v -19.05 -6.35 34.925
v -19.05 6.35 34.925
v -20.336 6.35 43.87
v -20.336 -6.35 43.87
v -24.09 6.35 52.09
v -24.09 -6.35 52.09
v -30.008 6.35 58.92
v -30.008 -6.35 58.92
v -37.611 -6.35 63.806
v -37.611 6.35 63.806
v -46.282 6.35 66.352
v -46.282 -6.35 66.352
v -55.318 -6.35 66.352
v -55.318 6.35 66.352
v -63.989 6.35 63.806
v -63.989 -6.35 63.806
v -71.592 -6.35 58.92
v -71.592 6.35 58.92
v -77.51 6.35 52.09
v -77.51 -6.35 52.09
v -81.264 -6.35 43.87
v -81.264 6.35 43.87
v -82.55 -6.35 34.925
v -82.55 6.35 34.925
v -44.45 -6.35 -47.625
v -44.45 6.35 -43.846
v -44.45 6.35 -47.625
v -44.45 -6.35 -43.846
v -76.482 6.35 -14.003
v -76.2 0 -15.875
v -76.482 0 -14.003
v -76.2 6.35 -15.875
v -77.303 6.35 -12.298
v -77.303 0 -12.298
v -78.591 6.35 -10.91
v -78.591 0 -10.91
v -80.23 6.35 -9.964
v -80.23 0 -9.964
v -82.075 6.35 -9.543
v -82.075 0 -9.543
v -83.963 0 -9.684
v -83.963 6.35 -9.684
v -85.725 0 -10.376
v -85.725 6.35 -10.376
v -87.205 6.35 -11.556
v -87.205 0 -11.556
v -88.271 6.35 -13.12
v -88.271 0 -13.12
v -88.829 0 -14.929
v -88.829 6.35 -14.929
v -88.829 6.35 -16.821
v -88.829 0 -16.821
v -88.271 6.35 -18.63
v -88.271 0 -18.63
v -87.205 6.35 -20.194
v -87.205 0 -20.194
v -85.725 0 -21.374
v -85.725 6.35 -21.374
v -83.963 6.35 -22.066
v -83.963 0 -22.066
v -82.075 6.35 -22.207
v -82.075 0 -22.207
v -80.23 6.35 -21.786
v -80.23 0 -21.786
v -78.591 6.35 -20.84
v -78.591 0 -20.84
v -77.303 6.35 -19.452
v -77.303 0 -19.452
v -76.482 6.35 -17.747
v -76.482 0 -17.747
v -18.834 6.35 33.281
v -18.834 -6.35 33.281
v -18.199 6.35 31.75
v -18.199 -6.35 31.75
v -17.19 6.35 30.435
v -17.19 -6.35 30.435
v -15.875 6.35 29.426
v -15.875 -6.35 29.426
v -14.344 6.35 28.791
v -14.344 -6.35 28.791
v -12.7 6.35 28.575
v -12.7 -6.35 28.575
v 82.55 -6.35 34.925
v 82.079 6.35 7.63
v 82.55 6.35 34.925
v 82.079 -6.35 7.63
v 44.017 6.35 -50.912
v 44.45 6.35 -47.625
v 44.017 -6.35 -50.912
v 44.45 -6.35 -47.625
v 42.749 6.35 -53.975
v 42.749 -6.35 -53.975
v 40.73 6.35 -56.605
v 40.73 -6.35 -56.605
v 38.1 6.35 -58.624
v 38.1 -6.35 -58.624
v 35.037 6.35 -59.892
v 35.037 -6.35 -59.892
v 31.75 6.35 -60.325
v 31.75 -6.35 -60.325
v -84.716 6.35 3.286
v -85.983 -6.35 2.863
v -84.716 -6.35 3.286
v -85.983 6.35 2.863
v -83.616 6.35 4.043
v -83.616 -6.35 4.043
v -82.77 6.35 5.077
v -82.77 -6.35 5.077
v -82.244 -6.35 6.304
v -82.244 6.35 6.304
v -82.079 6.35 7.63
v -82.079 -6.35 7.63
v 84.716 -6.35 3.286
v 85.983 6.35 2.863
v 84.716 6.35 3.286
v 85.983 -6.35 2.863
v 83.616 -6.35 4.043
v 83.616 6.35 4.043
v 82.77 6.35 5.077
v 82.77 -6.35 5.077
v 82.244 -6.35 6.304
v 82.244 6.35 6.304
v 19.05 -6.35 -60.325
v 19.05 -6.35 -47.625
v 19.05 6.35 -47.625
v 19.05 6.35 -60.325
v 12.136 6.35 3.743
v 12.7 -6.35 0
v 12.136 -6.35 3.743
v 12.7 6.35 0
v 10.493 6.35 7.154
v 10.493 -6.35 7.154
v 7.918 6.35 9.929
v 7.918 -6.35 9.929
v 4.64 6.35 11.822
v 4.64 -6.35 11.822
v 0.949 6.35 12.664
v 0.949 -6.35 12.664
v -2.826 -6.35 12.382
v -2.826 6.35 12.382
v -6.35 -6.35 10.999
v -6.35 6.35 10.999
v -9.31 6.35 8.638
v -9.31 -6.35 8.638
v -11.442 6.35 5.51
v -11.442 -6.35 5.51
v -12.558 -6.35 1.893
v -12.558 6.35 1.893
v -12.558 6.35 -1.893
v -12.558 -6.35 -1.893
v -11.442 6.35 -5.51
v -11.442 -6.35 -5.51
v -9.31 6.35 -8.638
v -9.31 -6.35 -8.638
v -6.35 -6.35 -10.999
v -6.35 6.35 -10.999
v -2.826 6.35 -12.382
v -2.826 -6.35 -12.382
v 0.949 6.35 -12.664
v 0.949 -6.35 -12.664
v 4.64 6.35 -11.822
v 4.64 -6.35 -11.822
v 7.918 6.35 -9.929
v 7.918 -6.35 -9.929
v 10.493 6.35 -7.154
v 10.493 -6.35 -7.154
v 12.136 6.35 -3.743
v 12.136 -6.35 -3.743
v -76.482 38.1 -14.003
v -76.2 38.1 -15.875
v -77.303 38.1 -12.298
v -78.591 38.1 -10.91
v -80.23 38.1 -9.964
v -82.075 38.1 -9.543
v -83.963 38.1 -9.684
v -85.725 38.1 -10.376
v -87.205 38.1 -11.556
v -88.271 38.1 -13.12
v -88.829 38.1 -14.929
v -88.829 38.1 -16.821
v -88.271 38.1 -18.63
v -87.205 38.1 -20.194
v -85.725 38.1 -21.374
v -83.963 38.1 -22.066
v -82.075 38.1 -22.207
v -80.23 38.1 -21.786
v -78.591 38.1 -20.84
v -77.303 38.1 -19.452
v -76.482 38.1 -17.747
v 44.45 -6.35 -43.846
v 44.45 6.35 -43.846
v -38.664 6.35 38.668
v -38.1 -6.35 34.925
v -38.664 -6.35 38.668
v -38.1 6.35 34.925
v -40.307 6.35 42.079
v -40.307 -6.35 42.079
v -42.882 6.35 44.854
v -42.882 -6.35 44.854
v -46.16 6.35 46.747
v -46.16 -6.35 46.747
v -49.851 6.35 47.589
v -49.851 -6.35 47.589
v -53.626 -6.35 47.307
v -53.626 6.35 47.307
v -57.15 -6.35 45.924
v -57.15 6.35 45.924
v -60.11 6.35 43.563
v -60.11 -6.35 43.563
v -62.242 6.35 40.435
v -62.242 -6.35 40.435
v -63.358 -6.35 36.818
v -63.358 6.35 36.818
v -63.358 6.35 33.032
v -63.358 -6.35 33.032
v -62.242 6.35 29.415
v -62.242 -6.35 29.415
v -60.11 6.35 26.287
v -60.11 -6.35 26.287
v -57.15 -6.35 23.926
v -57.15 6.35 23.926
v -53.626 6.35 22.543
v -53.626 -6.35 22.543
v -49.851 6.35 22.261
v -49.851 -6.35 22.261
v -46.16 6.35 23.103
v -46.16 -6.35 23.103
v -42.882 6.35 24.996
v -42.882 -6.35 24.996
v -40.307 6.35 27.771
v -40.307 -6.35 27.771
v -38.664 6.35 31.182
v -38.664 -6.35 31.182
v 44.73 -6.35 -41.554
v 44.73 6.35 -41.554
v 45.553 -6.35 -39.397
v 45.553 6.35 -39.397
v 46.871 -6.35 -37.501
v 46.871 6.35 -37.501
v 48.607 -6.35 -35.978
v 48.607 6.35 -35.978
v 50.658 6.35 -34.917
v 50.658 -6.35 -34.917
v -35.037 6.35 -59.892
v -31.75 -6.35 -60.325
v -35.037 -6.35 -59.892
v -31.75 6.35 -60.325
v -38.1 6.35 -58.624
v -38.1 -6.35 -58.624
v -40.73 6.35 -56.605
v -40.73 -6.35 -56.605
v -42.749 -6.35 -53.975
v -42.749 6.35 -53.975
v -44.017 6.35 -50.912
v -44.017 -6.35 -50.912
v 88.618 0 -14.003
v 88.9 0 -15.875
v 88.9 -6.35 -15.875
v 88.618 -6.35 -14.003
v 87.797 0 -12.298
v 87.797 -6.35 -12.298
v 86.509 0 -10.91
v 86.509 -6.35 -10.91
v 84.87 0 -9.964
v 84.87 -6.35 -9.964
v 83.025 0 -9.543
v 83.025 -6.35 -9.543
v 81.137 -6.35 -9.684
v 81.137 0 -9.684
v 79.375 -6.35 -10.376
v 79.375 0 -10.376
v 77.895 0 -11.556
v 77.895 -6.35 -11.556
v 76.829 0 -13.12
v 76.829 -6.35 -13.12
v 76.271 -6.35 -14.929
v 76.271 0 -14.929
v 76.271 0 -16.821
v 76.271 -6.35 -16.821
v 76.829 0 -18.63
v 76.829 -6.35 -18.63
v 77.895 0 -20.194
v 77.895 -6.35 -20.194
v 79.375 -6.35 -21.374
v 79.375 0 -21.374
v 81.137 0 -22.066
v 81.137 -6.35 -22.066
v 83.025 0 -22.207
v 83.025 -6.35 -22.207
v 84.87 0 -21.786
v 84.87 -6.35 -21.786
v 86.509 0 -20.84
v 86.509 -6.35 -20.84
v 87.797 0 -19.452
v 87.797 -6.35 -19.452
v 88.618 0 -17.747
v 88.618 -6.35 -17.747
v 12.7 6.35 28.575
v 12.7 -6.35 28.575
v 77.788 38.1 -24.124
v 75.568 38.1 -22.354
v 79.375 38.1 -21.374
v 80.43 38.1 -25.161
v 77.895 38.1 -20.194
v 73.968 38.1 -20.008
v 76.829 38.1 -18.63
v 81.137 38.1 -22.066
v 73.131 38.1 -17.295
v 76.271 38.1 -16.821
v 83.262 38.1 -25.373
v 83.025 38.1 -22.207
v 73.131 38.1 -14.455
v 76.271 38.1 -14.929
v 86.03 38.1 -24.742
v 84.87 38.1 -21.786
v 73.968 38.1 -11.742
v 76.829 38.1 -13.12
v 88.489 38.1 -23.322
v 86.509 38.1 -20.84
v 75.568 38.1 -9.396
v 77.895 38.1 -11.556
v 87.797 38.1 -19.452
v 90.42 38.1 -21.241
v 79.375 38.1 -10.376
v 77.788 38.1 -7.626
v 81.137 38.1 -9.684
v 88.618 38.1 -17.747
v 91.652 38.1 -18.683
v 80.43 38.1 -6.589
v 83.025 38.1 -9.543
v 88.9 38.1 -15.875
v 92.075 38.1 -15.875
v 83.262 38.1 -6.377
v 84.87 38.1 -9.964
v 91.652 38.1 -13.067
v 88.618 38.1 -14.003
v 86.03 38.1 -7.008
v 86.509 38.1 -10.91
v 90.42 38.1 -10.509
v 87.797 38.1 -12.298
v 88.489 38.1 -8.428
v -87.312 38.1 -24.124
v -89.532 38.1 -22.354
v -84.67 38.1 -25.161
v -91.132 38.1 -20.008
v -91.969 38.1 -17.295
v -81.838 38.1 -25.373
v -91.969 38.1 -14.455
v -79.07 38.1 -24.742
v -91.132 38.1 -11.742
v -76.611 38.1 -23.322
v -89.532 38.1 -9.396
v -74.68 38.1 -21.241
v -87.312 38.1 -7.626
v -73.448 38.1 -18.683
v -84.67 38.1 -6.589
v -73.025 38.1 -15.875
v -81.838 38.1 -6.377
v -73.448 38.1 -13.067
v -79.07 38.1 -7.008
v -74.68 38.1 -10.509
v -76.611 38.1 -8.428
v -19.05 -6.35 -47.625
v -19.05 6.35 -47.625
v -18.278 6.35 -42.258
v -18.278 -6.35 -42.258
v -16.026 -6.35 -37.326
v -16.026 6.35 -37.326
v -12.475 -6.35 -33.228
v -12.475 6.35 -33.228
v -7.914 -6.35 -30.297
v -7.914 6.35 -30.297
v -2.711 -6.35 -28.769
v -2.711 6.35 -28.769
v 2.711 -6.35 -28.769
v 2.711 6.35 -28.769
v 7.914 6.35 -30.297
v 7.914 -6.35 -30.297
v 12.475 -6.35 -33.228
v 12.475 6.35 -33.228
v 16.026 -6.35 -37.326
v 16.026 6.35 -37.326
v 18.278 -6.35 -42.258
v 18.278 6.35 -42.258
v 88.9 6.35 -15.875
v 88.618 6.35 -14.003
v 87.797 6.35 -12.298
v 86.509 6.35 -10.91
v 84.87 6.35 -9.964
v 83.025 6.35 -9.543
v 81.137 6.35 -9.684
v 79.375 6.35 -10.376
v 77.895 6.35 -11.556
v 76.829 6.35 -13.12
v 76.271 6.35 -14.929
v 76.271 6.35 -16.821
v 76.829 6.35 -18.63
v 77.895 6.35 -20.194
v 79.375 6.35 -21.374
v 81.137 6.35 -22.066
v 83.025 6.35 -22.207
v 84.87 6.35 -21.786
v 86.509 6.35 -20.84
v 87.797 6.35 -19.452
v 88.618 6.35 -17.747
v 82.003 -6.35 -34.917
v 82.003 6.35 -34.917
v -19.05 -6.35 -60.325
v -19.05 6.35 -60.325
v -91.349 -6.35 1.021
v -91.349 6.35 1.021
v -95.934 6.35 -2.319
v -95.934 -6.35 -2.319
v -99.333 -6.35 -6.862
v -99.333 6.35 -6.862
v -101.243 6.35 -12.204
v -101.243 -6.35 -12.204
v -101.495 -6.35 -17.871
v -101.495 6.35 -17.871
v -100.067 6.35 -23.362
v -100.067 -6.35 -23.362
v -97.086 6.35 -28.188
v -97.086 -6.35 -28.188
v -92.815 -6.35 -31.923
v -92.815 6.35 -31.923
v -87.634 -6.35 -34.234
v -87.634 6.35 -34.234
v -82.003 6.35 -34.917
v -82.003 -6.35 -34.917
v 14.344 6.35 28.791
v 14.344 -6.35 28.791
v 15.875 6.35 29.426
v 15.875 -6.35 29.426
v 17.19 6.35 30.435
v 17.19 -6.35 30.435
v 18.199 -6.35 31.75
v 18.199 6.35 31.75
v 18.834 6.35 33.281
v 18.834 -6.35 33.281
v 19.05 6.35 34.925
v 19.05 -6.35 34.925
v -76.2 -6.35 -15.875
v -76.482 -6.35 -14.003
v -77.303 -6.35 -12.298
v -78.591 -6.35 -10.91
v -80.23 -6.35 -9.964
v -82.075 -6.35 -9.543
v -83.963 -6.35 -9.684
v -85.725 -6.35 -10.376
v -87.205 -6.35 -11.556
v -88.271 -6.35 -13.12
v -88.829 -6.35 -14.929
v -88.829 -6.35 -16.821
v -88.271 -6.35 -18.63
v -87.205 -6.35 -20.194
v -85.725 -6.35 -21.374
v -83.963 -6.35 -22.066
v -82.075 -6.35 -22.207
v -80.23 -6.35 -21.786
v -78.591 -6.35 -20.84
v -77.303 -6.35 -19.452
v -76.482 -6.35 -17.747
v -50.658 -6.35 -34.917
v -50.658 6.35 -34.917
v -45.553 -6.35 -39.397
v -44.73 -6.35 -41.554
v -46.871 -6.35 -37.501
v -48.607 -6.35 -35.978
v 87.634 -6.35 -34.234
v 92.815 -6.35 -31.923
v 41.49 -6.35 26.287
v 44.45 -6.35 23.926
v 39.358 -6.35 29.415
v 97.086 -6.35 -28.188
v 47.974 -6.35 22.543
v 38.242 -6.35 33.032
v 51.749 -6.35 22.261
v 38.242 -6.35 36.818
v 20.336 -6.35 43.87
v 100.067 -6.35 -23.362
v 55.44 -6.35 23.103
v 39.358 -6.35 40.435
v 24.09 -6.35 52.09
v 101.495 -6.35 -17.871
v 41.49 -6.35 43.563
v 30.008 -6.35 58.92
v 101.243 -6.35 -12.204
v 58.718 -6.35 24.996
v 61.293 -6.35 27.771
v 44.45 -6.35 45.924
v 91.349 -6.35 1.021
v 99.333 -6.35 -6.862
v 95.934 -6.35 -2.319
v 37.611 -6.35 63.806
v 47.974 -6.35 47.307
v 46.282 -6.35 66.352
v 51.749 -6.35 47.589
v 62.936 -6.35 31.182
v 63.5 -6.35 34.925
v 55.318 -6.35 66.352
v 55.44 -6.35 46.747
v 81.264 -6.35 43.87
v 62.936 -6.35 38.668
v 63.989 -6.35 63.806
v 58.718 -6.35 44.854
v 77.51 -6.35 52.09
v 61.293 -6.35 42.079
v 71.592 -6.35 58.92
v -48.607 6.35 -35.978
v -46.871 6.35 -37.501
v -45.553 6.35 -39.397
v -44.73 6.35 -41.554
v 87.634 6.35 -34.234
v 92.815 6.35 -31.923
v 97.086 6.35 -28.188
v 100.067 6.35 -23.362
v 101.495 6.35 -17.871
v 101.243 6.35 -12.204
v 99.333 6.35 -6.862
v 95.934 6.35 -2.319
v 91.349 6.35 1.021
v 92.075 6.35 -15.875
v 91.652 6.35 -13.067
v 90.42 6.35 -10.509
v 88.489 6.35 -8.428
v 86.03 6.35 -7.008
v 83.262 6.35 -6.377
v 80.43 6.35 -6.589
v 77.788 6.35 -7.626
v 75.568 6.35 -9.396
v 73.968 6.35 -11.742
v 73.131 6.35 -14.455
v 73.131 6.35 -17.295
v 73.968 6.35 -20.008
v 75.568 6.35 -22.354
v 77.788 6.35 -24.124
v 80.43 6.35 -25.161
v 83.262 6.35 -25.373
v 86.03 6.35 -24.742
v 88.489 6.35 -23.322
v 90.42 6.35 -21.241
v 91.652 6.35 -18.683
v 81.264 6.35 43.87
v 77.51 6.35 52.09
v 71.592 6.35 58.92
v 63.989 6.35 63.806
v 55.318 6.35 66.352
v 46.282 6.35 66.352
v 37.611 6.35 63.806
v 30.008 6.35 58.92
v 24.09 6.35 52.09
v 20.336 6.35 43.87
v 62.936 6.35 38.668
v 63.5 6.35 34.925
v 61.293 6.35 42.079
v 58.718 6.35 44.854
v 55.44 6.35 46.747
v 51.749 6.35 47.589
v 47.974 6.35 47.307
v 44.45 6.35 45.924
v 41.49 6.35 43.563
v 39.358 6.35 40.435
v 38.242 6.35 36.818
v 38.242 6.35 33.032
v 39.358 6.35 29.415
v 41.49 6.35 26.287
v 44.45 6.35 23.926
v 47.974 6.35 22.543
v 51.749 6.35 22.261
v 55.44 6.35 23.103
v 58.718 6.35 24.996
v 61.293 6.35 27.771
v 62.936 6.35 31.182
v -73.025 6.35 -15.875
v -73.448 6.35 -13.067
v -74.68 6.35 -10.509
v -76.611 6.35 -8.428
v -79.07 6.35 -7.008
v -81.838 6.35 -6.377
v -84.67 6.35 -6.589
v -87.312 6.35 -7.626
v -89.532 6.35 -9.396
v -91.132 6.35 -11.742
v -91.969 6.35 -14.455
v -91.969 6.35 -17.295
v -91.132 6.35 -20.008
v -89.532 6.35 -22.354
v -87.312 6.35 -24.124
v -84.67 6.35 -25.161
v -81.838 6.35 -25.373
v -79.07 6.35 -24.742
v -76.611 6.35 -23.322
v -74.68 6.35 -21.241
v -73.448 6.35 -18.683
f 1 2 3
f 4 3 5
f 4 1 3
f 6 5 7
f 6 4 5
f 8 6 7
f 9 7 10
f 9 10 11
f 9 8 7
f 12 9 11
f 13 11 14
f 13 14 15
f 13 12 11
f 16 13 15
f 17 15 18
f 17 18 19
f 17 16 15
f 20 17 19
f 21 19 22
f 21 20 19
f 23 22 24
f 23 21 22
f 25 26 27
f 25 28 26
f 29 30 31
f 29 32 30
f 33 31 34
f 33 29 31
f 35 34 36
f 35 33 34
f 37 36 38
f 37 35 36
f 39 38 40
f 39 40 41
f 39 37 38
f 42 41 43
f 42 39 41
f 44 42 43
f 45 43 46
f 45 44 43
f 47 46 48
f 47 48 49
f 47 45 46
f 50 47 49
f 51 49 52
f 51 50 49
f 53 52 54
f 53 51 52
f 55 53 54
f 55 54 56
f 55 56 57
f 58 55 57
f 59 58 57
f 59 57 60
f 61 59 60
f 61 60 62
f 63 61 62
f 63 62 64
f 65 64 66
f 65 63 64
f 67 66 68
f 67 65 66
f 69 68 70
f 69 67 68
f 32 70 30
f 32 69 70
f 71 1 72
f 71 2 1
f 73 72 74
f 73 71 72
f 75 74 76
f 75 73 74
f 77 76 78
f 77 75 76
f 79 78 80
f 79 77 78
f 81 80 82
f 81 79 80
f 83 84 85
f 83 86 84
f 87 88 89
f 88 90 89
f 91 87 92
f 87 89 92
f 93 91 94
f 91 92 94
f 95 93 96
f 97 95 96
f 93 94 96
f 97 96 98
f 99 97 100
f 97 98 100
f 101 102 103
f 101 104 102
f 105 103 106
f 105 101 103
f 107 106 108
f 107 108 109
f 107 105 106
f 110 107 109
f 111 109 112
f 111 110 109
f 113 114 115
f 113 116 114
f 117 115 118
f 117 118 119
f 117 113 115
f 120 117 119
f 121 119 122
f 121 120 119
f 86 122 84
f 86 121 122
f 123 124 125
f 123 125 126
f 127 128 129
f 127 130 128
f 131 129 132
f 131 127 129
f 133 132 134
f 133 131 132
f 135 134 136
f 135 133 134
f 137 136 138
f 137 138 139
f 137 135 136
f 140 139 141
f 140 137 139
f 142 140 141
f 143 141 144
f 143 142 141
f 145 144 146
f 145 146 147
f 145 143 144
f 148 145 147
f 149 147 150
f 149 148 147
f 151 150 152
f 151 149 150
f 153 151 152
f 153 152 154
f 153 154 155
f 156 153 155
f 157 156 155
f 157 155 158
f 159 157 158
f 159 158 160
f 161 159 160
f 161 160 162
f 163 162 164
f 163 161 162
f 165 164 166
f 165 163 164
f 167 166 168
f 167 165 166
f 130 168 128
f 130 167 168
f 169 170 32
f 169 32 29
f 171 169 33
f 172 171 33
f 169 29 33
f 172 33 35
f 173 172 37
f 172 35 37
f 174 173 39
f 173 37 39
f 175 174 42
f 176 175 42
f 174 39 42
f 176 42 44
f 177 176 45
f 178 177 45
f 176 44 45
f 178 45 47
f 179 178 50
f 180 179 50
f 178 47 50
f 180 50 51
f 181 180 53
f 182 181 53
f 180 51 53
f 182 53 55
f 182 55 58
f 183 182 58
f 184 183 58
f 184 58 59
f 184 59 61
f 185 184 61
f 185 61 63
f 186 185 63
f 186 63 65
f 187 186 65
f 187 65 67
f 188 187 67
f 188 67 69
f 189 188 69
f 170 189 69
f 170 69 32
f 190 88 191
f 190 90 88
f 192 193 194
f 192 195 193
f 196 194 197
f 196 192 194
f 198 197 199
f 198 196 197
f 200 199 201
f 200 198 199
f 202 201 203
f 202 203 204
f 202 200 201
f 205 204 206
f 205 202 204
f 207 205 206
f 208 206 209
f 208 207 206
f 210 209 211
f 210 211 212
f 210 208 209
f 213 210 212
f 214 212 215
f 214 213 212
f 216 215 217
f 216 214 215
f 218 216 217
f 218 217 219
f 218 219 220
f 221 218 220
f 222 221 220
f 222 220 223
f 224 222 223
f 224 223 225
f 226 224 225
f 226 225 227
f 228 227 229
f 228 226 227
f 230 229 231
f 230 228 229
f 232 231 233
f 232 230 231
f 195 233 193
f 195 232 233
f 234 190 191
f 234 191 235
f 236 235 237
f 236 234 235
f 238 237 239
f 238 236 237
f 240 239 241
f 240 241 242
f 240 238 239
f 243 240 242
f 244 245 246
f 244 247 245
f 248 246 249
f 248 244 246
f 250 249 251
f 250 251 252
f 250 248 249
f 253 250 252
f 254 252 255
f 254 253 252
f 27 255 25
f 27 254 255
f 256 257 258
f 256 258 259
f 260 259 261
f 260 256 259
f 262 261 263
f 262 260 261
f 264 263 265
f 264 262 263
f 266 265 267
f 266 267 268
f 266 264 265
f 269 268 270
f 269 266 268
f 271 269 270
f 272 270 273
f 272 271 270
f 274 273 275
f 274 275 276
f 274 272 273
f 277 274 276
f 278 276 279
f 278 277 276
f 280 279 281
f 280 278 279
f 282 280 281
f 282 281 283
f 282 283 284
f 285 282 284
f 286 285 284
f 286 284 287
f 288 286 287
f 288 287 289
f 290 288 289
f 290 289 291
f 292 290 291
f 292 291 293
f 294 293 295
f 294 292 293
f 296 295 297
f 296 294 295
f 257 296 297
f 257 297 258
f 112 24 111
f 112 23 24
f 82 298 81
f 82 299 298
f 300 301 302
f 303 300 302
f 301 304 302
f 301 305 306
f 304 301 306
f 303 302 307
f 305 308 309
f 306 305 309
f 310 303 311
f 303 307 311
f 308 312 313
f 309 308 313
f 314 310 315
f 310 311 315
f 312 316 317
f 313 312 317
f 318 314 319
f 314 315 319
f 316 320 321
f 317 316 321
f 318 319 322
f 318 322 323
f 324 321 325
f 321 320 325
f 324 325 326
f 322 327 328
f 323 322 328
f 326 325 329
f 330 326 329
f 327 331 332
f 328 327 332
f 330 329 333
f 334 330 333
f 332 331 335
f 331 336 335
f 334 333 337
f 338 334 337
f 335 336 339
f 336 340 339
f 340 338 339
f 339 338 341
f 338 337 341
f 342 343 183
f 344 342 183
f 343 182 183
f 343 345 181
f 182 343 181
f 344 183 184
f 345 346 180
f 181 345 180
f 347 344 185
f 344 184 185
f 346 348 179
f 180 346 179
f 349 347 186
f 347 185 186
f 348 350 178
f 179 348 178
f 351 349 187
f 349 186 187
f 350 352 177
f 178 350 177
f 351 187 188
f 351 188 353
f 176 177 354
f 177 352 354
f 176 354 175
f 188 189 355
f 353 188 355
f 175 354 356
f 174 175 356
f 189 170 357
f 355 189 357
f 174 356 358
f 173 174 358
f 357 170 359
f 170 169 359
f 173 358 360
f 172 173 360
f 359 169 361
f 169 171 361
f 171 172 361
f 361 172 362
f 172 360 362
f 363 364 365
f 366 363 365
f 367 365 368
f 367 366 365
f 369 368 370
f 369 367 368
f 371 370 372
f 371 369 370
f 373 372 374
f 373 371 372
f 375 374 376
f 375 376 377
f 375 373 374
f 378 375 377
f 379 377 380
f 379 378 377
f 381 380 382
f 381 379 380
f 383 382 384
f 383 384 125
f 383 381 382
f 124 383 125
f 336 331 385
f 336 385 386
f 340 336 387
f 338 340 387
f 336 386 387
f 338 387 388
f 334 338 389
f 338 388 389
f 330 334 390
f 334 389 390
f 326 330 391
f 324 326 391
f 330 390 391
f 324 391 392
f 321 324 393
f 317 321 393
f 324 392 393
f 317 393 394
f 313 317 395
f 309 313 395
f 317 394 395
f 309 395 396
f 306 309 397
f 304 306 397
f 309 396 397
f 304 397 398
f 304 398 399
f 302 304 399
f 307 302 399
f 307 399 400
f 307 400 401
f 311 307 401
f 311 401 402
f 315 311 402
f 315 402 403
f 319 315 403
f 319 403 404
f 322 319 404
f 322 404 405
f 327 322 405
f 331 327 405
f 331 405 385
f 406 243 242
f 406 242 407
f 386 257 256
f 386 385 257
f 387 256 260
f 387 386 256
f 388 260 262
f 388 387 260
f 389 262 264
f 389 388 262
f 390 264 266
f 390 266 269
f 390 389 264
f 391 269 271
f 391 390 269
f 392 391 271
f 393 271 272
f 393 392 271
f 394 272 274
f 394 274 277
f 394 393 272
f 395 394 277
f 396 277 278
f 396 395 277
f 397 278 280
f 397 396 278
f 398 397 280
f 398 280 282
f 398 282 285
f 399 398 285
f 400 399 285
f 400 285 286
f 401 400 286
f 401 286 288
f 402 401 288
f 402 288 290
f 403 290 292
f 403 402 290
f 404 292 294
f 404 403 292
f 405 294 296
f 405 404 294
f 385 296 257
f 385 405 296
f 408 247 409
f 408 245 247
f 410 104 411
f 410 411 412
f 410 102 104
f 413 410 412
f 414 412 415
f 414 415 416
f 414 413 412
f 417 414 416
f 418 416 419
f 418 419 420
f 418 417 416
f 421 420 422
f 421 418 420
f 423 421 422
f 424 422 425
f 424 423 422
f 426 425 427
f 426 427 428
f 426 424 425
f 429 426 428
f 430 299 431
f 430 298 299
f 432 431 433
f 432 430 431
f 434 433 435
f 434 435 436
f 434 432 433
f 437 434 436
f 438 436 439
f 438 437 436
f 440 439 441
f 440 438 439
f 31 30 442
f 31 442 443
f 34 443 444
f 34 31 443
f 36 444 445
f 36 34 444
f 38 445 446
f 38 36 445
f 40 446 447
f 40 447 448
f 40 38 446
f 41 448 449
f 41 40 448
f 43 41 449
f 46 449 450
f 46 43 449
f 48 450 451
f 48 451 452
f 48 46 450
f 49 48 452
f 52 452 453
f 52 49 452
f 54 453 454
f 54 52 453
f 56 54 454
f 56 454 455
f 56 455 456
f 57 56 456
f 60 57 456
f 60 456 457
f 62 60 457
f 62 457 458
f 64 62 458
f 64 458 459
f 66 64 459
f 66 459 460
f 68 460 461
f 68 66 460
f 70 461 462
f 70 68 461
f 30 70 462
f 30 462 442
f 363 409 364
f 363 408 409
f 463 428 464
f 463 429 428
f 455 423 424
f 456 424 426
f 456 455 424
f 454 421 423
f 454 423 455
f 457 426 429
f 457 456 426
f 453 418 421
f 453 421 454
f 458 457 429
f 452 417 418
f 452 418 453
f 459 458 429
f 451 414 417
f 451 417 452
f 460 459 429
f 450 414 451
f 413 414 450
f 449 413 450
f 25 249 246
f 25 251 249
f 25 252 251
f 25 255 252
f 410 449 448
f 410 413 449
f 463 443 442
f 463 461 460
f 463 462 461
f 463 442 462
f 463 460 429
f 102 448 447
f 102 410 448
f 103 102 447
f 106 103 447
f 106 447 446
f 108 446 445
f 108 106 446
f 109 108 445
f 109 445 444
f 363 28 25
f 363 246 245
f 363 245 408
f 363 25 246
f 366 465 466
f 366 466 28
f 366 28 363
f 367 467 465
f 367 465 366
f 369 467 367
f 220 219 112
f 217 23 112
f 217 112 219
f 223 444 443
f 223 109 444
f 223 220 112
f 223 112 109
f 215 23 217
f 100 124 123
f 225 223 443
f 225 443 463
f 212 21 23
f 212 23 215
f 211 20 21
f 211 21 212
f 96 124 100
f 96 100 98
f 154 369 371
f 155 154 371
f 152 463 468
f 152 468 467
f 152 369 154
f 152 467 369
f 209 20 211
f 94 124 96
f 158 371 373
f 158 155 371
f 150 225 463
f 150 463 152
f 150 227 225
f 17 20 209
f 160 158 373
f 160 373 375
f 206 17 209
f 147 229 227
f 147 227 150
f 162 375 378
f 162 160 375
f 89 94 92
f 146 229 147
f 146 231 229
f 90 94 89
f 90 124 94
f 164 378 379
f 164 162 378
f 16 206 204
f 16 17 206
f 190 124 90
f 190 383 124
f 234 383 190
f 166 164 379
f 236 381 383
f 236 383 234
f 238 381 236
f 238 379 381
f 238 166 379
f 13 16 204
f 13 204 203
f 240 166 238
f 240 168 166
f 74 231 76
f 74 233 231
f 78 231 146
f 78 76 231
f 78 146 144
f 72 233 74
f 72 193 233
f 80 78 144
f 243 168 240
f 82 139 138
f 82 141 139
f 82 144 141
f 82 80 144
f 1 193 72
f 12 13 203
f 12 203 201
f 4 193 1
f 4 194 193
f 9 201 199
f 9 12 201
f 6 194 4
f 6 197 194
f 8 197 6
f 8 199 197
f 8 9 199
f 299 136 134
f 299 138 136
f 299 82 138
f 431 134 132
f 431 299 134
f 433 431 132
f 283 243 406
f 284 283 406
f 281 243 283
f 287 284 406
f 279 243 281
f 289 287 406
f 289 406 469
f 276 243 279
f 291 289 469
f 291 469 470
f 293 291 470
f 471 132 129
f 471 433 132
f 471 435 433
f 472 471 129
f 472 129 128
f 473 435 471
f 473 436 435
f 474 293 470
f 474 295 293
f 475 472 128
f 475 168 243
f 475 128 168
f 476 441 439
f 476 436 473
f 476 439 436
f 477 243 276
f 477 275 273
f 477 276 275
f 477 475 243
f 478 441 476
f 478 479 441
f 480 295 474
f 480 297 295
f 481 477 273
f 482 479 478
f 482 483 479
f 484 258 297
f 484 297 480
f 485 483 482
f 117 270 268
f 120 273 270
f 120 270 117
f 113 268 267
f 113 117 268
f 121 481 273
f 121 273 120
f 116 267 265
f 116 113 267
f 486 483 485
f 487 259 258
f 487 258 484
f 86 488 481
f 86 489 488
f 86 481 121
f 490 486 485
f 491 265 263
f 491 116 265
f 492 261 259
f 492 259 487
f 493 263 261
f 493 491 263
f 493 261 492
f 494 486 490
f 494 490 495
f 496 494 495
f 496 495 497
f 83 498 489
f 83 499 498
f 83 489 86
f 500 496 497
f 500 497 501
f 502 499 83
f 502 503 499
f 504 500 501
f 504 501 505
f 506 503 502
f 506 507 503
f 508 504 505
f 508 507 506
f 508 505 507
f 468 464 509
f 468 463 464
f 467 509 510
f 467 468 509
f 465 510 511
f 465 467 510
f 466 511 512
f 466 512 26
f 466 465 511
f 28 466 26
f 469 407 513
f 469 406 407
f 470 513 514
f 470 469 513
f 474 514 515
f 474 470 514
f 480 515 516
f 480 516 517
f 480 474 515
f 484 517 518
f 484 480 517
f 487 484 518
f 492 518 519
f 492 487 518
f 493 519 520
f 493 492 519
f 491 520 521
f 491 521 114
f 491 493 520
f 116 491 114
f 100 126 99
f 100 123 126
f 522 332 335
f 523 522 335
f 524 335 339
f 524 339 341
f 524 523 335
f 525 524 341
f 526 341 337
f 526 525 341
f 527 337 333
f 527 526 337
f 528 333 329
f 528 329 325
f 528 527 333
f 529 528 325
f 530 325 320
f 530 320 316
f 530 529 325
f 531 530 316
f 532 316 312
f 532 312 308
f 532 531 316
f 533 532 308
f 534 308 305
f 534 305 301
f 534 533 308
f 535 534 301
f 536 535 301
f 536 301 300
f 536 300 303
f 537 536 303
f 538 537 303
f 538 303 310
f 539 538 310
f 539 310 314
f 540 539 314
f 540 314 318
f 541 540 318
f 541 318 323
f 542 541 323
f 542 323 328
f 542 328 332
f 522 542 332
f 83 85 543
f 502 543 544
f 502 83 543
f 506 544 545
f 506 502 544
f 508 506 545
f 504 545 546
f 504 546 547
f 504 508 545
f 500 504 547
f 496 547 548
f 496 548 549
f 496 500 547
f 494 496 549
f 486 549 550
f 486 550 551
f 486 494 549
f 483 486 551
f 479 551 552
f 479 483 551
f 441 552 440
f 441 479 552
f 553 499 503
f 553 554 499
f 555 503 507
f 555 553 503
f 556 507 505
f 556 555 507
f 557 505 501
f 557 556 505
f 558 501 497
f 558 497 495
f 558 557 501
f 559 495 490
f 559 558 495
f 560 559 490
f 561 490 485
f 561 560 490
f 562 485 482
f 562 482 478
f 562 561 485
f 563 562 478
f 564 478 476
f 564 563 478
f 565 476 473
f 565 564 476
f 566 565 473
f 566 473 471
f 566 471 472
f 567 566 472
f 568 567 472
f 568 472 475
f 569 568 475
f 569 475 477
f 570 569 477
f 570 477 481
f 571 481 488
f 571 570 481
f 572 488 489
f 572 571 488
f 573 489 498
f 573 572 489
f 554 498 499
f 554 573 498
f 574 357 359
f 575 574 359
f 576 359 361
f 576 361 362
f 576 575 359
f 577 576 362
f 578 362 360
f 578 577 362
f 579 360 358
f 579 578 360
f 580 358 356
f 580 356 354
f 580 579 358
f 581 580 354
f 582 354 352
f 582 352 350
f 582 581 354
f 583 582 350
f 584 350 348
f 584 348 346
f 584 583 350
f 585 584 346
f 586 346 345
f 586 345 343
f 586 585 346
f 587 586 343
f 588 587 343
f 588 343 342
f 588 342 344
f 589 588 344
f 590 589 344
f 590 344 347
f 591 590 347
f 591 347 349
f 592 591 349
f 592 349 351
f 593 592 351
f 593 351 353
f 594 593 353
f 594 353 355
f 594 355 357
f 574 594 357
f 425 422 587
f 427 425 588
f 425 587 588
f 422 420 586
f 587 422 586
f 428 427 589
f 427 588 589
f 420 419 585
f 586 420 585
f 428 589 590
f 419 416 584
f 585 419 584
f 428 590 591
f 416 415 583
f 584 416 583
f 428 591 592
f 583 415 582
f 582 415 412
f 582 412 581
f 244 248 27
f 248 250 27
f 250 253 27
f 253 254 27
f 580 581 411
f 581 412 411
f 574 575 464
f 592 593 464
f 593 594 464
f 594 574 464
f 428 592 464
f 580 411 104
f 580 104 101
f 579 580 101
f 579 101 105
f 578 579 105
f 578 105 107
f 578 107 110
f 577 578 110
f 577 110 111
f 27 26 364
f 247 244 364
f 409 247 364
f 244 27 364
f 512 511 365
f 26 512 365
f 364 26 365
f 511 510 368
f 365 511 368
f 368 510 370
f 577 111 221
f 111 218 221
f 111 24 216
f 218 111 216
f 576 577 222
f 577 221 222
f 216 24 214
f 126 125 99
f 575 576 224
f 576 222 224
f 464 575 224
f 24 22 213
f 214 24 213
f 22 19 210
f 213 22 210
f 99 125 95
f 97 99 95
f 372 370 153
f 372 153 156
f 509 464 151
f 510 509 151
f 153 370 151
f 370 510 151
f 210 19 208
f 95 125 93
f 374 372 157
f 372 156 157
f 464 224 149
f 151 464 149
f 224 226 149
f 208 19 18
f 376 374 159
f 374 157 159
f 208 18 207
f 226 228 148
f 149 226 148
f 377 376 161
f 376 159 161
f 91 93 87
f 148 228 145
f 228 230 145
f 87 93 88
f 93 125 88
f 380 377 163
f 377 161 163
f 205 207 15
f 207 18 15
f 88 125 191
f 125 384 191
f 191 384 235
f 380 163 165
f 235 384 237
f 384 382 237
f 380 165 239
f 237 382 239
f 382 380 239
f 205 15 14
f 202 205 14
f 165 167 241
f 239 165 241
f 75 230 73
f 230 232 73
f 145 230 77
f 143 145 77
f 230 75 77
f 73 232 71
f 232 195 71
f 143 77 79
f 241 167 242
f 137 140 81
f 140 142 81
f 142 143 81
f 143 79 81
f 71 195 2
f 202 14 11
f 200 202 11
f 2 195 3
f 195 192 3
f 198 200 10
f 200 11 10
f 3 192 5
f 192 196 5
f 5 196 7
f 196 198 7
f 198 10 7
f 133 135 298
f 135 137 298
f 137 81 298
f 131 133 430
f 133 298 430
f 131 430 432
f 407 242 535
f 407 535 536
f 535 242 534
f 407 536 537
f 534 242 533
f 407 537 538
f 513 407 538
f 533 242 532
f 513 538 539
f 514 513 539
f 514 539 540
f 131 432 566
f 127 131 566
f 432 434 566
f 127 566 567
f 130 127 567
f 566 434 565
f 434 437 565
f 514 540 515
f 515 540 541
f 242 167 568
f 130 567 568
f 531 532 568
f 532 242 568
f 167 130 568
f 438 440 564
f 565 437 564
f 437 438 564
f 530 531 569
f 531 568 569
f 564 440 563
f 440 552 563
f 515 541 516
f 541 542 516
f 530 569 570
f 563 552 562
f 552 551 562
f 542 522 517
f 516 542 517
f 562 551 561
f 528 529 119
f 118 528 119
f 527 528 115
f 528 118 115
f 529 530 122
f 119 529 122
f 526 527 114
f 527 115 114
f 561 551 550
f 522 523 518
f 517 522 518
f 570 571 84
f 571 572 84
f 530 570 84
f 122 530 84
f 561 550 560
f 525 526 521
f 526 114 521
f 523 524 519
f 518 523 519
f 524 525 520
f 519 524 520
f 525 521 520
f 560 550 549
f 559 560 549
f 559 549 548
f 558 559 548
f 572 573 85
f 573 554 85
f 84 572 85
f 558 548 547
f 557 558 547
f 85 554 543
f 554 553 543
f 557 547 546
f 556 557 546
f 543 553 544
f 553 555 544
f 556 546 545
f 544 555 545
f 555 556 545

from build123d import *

# Parameters (mm, degrees)
F0_R     = 9.525
F0_R_2   = 12.7
F0_R_3   = 6.35
F1_DEPTH = 6.35
F2_R     = 12.7
F3_R     = 4.7625
F4_R     = 6.34999
F5_DEPTH = 38.1


# Not quite as in the source:
# - a fillet or chamfer is up to 0.001 mm smaller than in the source, because OpenCascade refuses the exact size


with BuildPart() as f1:
    # F0 (on Front) → F1 (new body, symmetric)
    with BuildSketch(Plane.XZ):
        with BuildLine():
            Line((-19.05, -60.325), (-19.05, -47.625))
            ThreePointArc((-19.05, -47.625), (0, -28.575), (19.05, -47.625))
            Line((19.05, -47.625), (19.05, -60.325))
            Line((19.05, -60.325), (44.45, -60.325))
            Line((44.45, -60.325), (44.45, -43.8458790377))
            ThreePointArc((44.45, -43.8458790377), (46.1544838519, -38.4084943559), (50.6579059691, -34.9171326425))
            Line((50.6579059691, -34.9171326425), (82.0025655956, -34.9171326425))
            ThreePointArc((82.0025655956, -34.9171326425), (101.6, -15.875), (82.0025655956, 3.1671326425))
            Line((82.0025655956, 3.1671326425), (82.55, 34.925))
            ThreePointArc((82.55, 34.925), (50.8, 66.675), (19.05, 34.925))
            Line((19.05, 34.925), (19.05, 28.575))
            Line((19.05, 28.575), (-19.05, 28.575))
            Line((-19.05, 28.575), (-19.05, 34.925))
            ThreePointArc((-19.05, 34.925), (-50.8, 66.675), (-82.55, 34.925))
            Line((-82.55, 34.925), (-82.0025655956, 3.1671326425))
            ThreePointArc((-82.0025655956, 3.1671326425), (-101.6, -15.875), (-82.0025655956, -34.9171326425))
            Line((-82.0025655956, -34.9171326425), (-50.6579059691, -34.9171326425))
            ThreePointArc((-50.6579059691, -34.9171326425), (-46.1544838519, -38.4084943559), (-44.45, -43.8458790377))
            Line((-44.45, -43.8458790377), (-44.45, -60.325))
            Line((-44.45, -60.325), (-19.05, -60.325))
        make_face()
        with Locations((-82.55, -15.875)):
            Circle(F0_R, mode=Mode.SUBTRACT)
        Circle(F0_R_2, mode=Mode.SUBTRACT)
        with Locations((82.55, -15.875)):
            Circle(F0_R, mode=Mode.SUBTRACT)
        with Locations((-50.8, 34.925)):
            Circle(F0_R_2, mode=Mode.SUBTRACT)
        with Locations((50.8, 34.925)):
            Circle(F0_R_2, mode=Mode.SUBTRACT)
        with Locations((-82.55, -15.875)):
            Circle(F0_R)
        with Locations((-82.55, -15.875)):
            Circle(F0_R_3, mode=Mode.SUBTRACT)
        with Locations((82.55, -15.875)):
            Circle(F0_R)
        with Locations((82.55, -15.875)):
            Circle(F0_R_3, mode=Mode.SUBTRACT)
    extrude(amount=F1_DEPTH, both=True)

    # F2
    f2_edges = [f1.edges().sort_by_distance(p)[0] for p in [
        (-44.45, 0, -60.325),
        (44.45, 0, -60.325),
    ]]
    fillet(f2_edges, radius=F2_R)

    # F3
    f3_edges = [f1.edges().sort_by_distance(p)[0] for p in [
        (-82.002566, 0, 3.167133),
        (82.002566, 0, 3.167133),
    ]]
    fillet(f3_edges, radius=F3_R)

    # F4 (radius 6.35 in the source; OpenCascade refuses exactly that, so slightly less here)
    f4_edges = [f1.edges().sort_by_distance(p)[0] for p in [
        (-19.05, 0, 28.575),
        (19.05, 0, 28.575),
    ]]
    fillet(f4_edges, radius=F4_R)

    # F0 (on Front) → F5 (join)
    with BuildSketch(Plane.XZ):
        with Locations((-82.55, -15.875)):
            Circle(F0_R)
        with Locations((-82.55, -15.875)):
            Circle(F0_R_3, mode=Mode.SUBTRACT)
        with Locations((82.55, -15.875)):
            Circle(F0_R)
        with Locations((82.55, -15.875)):
            Circle(F0_R_3, mode=Mode.SUBTRACT)
    extrude(amount=-F5_DEPTH)


solid = f1.part
